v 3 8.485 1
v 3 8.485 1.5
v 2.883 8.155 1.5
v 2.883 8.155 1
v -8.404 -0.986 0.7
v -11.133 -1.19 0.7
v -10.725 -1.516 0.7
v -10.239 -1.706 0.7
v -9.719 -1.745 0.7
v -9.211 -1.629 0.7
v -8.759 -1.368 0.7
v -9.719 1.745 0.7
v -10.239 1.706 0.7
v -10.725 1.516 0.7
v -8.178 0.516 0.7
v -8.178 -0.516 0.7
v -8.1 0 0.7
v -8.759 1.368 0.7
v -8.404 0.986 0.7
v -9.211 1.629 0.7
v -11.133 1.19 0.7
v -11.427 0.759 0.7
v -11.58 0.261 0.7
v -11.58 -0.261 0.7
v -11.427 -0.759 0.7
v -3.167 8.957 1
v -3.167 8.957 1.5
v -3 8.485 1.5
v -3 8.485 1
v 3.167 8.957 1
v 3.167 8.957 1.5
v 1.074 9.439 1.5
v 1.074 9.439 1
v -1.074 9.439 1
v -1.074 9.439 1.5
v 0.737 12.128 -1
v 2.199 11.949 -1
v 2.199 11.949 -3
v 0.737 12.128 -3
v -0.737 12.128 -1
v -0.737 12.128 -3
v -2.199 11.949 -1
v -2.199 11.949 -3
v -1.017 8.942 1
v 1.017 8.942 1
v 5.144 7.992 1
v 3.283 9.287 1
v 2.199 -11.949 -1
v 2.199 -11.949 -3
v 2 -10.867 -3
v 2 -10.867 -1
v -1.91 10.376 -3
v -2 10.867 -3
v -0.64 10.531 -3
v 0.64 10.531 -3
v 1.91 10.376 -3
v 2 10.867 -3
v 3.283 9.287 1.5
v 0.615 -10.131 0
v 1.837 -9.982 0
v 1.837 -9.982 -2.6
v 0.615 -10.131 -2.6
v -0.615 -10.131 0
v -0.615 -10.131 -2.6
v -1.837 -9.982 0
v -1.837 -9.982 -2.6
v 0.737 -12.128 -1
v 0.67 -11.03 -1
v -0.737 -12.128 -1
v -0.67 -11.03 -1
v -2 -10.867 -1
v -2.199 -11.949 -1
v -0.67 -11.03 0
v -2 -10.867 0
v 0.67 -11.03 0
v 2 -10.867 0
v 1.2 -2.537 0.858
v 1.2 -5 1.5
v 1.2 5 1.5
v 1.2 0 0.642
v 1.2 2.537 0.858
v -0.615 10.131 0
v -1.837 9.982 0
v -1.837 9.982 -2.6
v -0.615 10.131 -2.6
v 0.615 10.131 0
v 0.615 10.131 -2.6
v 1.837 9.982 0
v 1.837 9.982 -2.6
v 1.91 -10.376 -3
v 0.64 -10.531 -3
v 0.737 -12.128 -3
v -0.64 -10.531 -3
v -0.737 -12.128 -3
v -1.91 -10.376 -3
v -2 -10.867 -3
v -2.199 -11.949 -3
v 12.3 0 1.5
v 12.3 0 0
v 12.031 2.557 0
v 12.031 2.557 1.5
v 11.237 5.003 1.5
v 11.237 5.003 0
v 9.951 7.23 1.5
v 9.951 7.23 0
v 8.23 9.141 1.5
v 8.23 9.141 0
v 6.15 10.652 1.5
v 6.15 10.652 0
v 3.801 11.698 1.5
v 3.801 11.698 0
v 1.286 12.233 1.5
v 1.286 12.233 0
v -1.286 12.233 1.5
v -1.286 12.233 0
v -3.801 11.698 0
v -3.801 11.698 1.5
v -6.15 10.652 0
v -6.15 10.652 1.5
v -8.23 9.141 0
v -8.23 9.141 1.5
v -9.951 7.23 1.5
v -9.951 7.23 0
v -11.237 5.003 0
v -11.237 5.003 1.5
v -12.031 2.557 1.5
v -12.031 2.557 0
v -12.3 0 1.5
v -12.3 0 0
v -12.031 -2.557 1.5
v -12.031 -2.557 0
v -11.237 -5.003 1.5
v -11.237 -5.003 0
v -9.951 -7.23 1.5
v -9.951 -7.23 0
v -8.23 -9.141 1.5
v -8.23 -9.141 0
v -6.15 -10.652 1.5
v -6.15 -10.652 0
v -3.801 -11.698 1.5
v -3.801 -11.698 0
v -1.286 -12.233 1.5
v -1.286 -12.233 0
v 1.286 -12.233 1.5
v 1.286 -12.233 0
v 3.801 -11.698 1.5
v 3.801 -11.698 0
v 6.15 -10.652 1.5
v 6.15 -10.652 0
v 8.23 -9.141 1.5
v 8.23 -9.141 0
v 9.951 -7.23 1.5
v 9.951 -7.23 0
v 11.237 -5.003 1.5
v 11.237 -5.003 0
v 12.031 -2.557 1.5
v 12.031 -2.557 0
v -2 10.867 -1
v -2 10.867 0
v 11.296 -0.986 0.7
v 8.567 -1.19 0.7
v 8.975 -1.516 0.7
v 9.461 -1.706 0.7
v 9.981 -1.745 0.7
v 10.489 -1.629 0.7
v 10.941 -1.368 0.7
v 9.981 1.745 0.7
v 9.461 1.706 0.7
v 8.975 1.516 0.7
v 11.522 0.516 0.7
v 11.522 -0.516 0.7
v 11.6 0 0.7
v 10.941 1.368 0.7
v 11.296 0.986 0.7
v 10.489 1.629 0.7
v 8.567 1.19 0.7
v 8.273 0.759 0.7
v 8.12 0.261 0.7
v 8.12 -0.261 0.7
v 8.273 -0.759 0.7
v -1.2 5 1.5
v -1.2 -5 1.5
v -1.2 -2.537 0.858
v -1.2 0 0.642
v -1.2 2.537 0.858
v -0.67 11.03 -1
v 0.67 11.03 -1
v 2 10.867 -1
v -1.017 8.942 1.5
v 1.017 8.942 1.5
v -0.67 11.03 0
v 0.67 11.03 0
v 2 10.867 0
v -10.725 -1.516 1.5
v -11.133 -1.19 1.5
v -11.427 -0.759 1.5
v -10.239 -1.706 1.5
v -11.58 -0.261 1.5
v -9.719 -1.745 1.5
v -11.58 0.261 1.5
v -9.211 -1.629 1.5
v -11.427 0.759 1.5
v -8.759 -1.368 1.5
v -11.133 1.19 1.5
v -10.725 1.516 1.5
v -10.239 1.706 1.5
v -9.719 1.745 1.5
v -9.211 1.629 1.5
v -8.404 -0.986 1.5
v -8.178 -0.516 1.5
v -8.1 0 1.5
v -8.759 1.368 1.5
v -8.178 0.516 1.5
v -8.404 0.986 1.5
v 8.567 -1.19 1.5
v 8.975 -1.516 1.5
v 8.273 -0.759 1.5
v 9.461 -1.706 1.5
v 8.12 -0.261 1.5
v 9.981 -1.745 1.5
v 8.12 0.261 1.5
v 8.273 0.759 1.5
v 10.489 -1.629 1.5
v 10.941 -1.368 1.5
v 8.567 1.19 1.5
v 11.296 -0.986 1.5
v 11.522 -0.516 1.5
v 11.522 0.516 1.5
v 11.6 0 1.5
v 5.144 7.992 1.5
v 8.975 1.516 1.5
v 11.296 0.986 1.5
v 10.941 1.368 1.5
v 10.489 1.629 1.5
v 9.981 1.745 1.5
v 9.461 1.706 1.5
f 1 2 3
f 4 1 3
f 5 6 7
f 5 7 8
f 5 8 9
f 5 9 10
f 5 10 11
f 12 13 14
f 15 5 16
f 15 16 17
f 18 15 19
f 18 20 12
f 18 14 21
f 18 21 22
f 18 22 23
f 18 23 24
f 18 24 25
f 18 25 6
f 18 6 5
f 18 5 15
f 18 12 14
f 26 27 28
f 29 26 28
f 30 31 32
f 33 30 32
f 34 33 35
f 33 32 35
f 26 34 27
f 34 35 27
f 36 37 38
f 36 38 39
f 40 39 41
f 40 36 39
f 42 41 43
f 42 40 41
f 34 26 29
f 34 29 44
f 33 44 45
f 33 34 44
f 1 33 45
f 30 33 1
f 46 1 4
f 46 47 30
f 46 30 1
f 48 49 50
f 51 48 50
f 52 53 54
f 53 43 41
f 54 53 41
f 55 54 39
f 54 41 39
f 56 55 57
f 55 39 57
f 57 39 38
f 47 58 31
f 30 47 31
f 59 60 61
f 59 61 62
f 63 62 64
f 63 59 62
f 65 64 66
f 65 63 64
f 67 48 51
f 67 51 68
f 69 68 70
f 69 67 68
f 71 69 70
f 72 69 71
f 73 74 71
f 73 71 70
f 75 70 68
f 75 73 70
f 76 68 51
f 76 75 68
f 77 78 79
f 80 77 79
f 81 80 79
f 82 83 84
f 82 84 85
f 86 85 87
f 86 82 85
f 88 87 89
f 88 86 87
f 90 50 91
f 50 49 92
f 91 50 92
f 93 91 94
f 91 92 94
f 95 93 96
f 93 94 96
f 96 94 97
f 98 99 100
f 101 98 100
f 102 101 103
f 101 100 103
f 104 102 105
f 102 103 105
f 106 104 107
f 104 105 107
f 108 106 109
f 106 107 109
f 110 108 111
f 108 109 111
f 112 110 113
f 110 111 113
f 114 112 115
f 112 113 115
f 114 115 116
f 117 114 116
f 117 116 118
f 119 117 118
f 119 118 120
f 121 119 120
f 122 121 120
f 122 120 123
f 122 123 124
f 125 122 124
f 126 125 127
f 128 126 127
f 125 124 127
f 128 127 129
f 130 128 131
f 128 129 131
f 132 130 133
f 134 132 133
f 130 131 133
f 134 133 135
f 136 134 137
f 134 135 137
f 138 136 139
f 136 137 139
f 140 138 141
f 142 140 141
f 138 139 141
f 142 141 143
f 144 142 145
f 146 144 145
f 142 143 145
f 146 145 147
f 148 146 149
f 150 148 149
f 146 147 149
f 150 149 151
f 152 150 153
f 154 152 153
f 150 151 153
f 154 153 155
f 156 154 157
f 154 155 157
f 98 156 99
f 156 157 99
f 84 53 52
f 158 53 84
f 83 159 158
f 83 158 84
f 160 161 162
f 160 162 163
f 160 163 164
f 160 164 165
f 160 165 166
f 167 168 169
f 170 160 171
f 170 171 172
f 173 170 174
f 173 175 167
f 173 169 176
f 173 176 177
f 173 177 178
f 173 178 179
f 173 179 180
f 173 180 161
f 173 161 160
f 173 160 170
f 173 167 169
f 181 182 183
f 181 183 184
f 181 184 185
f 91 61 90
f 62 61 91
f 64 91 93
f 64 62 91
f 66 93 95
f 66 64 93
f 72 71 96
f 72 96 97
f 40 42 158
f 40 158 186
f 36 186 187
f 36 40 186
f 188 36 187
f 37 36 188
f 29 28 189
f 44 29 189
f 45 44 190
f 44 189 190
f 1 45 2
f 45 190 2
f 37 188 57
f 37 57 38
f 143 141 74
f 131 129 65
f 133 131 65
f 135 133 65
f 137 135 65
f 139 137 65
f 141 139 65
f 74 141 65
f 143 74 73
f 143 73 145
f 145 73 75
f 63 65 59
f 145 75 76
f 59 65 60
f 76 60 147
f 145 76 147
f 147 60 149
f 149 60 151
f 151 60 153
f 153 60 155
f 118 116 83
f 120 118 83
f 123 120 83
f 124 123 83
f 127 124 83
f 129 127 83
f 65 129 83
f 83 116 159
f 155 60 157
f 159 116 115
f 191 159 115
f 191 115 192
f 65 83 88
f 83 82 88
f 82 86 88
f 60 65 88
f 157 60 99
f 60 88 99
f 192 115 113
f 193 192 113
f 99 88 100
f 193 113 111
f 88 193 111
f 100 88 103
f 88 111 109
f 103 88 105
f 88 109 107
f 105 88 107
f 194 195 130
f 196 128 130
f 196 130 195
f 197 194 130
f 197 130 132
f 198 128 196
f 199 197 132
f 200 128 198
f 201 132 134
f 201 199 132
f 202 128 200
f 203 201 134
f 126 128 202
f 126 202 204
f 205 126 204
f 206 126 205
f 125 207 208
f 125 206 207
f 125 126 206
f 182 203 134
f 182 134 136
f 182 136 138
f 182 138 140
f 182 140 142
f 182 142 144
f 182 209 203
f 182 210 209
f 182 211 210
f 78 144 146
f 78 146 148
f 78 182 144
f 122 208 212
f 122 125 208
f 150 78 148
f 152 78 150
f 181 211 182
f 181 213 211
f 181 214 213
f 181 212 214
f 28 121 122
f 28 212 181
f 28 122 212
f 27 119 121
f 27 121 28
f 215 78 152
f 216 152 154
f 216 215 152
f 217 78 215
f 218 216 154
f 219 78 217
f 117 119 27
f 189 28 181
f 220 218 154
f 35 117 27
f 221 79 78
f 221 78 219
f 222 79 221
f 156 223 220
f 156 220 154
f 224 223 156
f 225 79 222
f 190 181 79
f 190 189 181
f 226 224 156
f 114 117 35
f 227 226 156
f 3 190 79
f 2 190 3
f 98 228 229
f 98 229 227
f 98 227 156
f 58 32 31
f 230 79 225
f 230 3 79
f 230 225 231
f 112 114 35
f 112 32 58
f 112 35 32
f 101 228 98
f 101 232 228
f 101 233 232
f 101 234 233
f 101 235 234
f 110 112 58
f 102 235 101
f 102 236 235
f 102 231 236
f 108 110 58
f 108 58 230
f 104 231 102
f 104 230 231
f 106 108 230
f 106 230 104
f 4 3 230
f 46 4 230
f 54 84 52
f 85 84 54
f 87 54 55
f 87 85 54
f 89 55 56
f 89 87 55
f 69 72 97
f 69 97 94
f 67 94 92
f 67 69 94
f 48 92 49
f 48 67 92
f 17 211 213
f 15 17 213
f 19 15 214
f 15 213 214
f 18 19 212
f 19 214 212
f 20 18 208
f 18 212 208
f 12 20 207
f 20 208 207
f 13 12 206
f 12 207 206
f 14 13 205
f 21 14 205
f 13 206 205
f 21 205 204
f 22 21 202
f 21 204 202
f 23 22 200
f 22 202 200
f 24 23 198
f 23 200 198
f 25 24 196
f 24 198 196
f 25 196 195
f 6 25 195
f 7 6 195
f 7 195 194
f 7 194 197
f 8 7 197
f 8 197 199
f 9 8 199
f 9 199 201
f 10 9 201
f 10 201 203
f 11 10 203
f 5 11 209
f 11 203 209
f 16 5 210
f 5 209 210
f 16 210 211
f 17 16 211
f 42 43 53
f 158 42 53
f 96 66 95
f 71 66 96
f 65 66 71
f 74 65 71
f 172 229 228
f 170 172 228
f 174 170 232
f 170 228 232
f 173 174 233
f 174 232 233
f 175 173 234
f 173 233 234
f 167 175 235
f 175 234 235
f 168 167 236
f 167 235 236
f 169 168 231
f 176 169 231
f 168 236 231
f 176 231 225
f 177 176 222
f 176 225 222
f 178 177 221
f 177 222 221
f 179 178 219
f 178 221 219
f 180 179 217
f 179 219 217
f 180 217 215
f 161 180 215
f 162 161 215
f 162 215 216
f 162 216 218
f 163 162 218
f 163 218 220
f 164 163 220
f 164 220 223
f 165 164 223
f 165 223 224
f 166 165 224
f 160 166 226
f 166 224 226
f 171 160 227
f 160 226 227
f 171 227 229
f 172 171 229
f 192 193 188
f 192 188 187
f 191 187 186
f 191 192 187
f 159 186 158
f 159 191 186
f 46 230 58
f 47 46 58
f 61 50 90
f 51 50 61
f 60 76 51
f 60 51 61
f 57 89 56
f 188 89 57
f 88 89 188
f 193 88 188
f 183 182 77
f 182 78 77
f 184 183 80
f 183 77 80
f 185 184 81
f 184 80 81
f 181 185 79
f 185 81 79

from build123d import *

# Parameters (mm, degrees)
SKICA1_R                      = 12.3
P_IDAT_VYSUNUT_M1_DEPTH       = 1.5
ODEBRAT_START                 = 1.5
SKICA1_6_R                    = 1.75
ODEBRAT_VYSUNUT_M3_DEPTH      = 0.8
P_IDAT_VYSUNUT_M3_DEPTH       = 3
P_IDAT_START                  = 1
P_IDAT_VYSUNUT_M4_DEPTH       = 2
ZKOSEN_1_SIZE                 = 0.4
KRUHOV_POLE1_COUNT            = 2
ZKOSEN_1_OF_KRUHOV_POLE1_SIZE = 0.4
ODEBRAT_VYSUNUT_M2_DEPTH      = 0.5
ODEBRAT_VYSUNUT_M1_DEPTH      = 1.2
ODEBRAT_VYSUNUT_M1_DEPTH_BACK = 1.2


with BuildPart() as part:
    # Skica1 → P_idat vysunut_m1 (new body)
    with BuildSketch(Plane.XY):
        Circle(SKICA1_R)
    extrude(amount=P_IDAT_VYSUNUT_M1_DEPTH)

    # Skica1_6 → Odebrat vysunut_m3 (cut)
    with BuildSketch(Plane.XY.offset(ODEBRAT_START)):
        with Locations((-9.85, 0)):
            Circle(SKICA1_6_R)
        with Locations((9.85, 0)):
            Circle(SKICA1_6_R)
    extrude(amount=-ODEBRAT_VYSUNUT_M3_DEPTH, mode=Mode.SUBTRACT)

    # Skica1_5 → P_idat vysunut_m3 (add)
    with BuildSketch(Plane.XY):
        with BuildLine():
            Line((-2, 10.867497412), (-1.837104072, 9.982361876))
            ThreePointArc((-1.837104072, 9.982361876), (0, 10.15), (1.837104072, 9.982361876))
            Line((1.837104072, 9.982361876), (2, 10.867497412))
            ThreePointArc((2, 10.867497412), (0, 11.05), (-2, 10.867497412))
        make_face()
    p_idat_vysunut_m3 = extrude(amount=-P_IDAT_VYSUNUT_M3_DEPTH)

    # Skica2 → P_idat vysunut_m4 (add)
    with BuildSketch(Plane(origin=(0, 0, 0), x_dir=(-1, 0, 0), z_dir=(0, 0, -1)).offset(P_IDAT_START)):
        with BuildLine():
            Line((-2, 10.867497412), (-2.199095023, 11.949329734))
            ThreePointArc((-2.199095023, 11.949329734), (0, 12.15), (2.199095023, 11.949329734))
            Line((2.199095023, 11.949329734), (2, 10.867497412))
            ThreePointArc((2, 10.867497412), (0, 11.05), (-2, 10.867497412))
        make_face()
    p_idat_vysunut_m4 = extrude(amount=P_IDAT_VYSUNUT_M4_DEPTH)

    # Zkosen_1
    zkosen_1_edges = [part.edges().sort_by_distance(p)[0] for p in [
        (0, 10.15, -3),
    ]]
    chamfer(zkosen_1_edges, length=ZKOSEN_1_SIZE)

    # Kruhov_ pole1: P_idat vysunut_m3, P_idat vysunut_m4 ×2 about axis
    kruhov_pole1_axis = Axis((0, 0, 0), (0, 0, 1))
    for i in range(1, KRUHOV_POLE1_COUNT):
        add(p_idat_vysunut_m3.rotate(kruhov_pole1_axis, i * 360 / KRUHOV_POLE1_COUNT))
        add(p_idat_vysunut_m4.rotate(kruhov_pole1_axis, i * 360 / KRUHOV_POLE1_COUNT))

    # Zkosen_1 of Kruhov_ pole1
    zkosen_1_of_kruhov_pole1_edges = [part.edges().sort_by_distance(p)[0] for p in [
        (0, -10.15, -3),
    ]]
    chamfer(zkosen_1_of_kruhov_pole1_edges, length=ZKOSEN_1_OF_KRUHOV_POLE1_SIZE)

    # Skica3 → Odebrat vysunut_m2 (cut)
    with BuildSketch(Plane.XY.offset(1.5)):
        with BuildLine():
            Line((-3.166666667, 8.956685895), (-3, 8.485281374))
            ThreePointArc((-3, 8.485281374), (0, 9), (3, 8.485281374))
            Line((3, 8.485281374), (2.883333333, 8.15529821))
            Line((2.883333333, 8.15529821), (5.144077535, 7.992400535))
            Line((5.144077535, 7.992400535), (3.283333333, 9.28666906))
            Line((3.283333333, 9.28666906), (3.166666667, 8.956685895))
            ThreePointArc((3.166666667, 8.956685895), (0, 9.5), (-3.166666667, 8.956685895))
        make_face()
    extrude(amount=-ODEBRAT_VYSUNUT_M2_DEPTH, mode=Mode.SUBTRACT)

    # Skica4 → Odebrat vysunut_m1 (cut, two sides)
    with BuildSketch(Plane(origin=(0, 0, 0), x_dir=(0, 0, -1), z_dir=(1, 0, 0))) as odebrat_vysunut_m1_sk:
        with BuildLine():
            Line((-1.5, 5), (-1.5, -5))
            ThreePointArc((-1.5, -5), (-0.642135624, 0), (-1.5, 5))
        make_face()
    extrude(amount=ODEBRAT_VYSUNUT_M1_DEPTH, mode=Mode.SUBTRACT)
    extrude(odebrat_vysunut_m1_sk.sketch, amount=-ODEBRAT_VYSUNUT_M1_DEPTH_BACK, mode=Mode.SUBTRACT)


solid = part.part
